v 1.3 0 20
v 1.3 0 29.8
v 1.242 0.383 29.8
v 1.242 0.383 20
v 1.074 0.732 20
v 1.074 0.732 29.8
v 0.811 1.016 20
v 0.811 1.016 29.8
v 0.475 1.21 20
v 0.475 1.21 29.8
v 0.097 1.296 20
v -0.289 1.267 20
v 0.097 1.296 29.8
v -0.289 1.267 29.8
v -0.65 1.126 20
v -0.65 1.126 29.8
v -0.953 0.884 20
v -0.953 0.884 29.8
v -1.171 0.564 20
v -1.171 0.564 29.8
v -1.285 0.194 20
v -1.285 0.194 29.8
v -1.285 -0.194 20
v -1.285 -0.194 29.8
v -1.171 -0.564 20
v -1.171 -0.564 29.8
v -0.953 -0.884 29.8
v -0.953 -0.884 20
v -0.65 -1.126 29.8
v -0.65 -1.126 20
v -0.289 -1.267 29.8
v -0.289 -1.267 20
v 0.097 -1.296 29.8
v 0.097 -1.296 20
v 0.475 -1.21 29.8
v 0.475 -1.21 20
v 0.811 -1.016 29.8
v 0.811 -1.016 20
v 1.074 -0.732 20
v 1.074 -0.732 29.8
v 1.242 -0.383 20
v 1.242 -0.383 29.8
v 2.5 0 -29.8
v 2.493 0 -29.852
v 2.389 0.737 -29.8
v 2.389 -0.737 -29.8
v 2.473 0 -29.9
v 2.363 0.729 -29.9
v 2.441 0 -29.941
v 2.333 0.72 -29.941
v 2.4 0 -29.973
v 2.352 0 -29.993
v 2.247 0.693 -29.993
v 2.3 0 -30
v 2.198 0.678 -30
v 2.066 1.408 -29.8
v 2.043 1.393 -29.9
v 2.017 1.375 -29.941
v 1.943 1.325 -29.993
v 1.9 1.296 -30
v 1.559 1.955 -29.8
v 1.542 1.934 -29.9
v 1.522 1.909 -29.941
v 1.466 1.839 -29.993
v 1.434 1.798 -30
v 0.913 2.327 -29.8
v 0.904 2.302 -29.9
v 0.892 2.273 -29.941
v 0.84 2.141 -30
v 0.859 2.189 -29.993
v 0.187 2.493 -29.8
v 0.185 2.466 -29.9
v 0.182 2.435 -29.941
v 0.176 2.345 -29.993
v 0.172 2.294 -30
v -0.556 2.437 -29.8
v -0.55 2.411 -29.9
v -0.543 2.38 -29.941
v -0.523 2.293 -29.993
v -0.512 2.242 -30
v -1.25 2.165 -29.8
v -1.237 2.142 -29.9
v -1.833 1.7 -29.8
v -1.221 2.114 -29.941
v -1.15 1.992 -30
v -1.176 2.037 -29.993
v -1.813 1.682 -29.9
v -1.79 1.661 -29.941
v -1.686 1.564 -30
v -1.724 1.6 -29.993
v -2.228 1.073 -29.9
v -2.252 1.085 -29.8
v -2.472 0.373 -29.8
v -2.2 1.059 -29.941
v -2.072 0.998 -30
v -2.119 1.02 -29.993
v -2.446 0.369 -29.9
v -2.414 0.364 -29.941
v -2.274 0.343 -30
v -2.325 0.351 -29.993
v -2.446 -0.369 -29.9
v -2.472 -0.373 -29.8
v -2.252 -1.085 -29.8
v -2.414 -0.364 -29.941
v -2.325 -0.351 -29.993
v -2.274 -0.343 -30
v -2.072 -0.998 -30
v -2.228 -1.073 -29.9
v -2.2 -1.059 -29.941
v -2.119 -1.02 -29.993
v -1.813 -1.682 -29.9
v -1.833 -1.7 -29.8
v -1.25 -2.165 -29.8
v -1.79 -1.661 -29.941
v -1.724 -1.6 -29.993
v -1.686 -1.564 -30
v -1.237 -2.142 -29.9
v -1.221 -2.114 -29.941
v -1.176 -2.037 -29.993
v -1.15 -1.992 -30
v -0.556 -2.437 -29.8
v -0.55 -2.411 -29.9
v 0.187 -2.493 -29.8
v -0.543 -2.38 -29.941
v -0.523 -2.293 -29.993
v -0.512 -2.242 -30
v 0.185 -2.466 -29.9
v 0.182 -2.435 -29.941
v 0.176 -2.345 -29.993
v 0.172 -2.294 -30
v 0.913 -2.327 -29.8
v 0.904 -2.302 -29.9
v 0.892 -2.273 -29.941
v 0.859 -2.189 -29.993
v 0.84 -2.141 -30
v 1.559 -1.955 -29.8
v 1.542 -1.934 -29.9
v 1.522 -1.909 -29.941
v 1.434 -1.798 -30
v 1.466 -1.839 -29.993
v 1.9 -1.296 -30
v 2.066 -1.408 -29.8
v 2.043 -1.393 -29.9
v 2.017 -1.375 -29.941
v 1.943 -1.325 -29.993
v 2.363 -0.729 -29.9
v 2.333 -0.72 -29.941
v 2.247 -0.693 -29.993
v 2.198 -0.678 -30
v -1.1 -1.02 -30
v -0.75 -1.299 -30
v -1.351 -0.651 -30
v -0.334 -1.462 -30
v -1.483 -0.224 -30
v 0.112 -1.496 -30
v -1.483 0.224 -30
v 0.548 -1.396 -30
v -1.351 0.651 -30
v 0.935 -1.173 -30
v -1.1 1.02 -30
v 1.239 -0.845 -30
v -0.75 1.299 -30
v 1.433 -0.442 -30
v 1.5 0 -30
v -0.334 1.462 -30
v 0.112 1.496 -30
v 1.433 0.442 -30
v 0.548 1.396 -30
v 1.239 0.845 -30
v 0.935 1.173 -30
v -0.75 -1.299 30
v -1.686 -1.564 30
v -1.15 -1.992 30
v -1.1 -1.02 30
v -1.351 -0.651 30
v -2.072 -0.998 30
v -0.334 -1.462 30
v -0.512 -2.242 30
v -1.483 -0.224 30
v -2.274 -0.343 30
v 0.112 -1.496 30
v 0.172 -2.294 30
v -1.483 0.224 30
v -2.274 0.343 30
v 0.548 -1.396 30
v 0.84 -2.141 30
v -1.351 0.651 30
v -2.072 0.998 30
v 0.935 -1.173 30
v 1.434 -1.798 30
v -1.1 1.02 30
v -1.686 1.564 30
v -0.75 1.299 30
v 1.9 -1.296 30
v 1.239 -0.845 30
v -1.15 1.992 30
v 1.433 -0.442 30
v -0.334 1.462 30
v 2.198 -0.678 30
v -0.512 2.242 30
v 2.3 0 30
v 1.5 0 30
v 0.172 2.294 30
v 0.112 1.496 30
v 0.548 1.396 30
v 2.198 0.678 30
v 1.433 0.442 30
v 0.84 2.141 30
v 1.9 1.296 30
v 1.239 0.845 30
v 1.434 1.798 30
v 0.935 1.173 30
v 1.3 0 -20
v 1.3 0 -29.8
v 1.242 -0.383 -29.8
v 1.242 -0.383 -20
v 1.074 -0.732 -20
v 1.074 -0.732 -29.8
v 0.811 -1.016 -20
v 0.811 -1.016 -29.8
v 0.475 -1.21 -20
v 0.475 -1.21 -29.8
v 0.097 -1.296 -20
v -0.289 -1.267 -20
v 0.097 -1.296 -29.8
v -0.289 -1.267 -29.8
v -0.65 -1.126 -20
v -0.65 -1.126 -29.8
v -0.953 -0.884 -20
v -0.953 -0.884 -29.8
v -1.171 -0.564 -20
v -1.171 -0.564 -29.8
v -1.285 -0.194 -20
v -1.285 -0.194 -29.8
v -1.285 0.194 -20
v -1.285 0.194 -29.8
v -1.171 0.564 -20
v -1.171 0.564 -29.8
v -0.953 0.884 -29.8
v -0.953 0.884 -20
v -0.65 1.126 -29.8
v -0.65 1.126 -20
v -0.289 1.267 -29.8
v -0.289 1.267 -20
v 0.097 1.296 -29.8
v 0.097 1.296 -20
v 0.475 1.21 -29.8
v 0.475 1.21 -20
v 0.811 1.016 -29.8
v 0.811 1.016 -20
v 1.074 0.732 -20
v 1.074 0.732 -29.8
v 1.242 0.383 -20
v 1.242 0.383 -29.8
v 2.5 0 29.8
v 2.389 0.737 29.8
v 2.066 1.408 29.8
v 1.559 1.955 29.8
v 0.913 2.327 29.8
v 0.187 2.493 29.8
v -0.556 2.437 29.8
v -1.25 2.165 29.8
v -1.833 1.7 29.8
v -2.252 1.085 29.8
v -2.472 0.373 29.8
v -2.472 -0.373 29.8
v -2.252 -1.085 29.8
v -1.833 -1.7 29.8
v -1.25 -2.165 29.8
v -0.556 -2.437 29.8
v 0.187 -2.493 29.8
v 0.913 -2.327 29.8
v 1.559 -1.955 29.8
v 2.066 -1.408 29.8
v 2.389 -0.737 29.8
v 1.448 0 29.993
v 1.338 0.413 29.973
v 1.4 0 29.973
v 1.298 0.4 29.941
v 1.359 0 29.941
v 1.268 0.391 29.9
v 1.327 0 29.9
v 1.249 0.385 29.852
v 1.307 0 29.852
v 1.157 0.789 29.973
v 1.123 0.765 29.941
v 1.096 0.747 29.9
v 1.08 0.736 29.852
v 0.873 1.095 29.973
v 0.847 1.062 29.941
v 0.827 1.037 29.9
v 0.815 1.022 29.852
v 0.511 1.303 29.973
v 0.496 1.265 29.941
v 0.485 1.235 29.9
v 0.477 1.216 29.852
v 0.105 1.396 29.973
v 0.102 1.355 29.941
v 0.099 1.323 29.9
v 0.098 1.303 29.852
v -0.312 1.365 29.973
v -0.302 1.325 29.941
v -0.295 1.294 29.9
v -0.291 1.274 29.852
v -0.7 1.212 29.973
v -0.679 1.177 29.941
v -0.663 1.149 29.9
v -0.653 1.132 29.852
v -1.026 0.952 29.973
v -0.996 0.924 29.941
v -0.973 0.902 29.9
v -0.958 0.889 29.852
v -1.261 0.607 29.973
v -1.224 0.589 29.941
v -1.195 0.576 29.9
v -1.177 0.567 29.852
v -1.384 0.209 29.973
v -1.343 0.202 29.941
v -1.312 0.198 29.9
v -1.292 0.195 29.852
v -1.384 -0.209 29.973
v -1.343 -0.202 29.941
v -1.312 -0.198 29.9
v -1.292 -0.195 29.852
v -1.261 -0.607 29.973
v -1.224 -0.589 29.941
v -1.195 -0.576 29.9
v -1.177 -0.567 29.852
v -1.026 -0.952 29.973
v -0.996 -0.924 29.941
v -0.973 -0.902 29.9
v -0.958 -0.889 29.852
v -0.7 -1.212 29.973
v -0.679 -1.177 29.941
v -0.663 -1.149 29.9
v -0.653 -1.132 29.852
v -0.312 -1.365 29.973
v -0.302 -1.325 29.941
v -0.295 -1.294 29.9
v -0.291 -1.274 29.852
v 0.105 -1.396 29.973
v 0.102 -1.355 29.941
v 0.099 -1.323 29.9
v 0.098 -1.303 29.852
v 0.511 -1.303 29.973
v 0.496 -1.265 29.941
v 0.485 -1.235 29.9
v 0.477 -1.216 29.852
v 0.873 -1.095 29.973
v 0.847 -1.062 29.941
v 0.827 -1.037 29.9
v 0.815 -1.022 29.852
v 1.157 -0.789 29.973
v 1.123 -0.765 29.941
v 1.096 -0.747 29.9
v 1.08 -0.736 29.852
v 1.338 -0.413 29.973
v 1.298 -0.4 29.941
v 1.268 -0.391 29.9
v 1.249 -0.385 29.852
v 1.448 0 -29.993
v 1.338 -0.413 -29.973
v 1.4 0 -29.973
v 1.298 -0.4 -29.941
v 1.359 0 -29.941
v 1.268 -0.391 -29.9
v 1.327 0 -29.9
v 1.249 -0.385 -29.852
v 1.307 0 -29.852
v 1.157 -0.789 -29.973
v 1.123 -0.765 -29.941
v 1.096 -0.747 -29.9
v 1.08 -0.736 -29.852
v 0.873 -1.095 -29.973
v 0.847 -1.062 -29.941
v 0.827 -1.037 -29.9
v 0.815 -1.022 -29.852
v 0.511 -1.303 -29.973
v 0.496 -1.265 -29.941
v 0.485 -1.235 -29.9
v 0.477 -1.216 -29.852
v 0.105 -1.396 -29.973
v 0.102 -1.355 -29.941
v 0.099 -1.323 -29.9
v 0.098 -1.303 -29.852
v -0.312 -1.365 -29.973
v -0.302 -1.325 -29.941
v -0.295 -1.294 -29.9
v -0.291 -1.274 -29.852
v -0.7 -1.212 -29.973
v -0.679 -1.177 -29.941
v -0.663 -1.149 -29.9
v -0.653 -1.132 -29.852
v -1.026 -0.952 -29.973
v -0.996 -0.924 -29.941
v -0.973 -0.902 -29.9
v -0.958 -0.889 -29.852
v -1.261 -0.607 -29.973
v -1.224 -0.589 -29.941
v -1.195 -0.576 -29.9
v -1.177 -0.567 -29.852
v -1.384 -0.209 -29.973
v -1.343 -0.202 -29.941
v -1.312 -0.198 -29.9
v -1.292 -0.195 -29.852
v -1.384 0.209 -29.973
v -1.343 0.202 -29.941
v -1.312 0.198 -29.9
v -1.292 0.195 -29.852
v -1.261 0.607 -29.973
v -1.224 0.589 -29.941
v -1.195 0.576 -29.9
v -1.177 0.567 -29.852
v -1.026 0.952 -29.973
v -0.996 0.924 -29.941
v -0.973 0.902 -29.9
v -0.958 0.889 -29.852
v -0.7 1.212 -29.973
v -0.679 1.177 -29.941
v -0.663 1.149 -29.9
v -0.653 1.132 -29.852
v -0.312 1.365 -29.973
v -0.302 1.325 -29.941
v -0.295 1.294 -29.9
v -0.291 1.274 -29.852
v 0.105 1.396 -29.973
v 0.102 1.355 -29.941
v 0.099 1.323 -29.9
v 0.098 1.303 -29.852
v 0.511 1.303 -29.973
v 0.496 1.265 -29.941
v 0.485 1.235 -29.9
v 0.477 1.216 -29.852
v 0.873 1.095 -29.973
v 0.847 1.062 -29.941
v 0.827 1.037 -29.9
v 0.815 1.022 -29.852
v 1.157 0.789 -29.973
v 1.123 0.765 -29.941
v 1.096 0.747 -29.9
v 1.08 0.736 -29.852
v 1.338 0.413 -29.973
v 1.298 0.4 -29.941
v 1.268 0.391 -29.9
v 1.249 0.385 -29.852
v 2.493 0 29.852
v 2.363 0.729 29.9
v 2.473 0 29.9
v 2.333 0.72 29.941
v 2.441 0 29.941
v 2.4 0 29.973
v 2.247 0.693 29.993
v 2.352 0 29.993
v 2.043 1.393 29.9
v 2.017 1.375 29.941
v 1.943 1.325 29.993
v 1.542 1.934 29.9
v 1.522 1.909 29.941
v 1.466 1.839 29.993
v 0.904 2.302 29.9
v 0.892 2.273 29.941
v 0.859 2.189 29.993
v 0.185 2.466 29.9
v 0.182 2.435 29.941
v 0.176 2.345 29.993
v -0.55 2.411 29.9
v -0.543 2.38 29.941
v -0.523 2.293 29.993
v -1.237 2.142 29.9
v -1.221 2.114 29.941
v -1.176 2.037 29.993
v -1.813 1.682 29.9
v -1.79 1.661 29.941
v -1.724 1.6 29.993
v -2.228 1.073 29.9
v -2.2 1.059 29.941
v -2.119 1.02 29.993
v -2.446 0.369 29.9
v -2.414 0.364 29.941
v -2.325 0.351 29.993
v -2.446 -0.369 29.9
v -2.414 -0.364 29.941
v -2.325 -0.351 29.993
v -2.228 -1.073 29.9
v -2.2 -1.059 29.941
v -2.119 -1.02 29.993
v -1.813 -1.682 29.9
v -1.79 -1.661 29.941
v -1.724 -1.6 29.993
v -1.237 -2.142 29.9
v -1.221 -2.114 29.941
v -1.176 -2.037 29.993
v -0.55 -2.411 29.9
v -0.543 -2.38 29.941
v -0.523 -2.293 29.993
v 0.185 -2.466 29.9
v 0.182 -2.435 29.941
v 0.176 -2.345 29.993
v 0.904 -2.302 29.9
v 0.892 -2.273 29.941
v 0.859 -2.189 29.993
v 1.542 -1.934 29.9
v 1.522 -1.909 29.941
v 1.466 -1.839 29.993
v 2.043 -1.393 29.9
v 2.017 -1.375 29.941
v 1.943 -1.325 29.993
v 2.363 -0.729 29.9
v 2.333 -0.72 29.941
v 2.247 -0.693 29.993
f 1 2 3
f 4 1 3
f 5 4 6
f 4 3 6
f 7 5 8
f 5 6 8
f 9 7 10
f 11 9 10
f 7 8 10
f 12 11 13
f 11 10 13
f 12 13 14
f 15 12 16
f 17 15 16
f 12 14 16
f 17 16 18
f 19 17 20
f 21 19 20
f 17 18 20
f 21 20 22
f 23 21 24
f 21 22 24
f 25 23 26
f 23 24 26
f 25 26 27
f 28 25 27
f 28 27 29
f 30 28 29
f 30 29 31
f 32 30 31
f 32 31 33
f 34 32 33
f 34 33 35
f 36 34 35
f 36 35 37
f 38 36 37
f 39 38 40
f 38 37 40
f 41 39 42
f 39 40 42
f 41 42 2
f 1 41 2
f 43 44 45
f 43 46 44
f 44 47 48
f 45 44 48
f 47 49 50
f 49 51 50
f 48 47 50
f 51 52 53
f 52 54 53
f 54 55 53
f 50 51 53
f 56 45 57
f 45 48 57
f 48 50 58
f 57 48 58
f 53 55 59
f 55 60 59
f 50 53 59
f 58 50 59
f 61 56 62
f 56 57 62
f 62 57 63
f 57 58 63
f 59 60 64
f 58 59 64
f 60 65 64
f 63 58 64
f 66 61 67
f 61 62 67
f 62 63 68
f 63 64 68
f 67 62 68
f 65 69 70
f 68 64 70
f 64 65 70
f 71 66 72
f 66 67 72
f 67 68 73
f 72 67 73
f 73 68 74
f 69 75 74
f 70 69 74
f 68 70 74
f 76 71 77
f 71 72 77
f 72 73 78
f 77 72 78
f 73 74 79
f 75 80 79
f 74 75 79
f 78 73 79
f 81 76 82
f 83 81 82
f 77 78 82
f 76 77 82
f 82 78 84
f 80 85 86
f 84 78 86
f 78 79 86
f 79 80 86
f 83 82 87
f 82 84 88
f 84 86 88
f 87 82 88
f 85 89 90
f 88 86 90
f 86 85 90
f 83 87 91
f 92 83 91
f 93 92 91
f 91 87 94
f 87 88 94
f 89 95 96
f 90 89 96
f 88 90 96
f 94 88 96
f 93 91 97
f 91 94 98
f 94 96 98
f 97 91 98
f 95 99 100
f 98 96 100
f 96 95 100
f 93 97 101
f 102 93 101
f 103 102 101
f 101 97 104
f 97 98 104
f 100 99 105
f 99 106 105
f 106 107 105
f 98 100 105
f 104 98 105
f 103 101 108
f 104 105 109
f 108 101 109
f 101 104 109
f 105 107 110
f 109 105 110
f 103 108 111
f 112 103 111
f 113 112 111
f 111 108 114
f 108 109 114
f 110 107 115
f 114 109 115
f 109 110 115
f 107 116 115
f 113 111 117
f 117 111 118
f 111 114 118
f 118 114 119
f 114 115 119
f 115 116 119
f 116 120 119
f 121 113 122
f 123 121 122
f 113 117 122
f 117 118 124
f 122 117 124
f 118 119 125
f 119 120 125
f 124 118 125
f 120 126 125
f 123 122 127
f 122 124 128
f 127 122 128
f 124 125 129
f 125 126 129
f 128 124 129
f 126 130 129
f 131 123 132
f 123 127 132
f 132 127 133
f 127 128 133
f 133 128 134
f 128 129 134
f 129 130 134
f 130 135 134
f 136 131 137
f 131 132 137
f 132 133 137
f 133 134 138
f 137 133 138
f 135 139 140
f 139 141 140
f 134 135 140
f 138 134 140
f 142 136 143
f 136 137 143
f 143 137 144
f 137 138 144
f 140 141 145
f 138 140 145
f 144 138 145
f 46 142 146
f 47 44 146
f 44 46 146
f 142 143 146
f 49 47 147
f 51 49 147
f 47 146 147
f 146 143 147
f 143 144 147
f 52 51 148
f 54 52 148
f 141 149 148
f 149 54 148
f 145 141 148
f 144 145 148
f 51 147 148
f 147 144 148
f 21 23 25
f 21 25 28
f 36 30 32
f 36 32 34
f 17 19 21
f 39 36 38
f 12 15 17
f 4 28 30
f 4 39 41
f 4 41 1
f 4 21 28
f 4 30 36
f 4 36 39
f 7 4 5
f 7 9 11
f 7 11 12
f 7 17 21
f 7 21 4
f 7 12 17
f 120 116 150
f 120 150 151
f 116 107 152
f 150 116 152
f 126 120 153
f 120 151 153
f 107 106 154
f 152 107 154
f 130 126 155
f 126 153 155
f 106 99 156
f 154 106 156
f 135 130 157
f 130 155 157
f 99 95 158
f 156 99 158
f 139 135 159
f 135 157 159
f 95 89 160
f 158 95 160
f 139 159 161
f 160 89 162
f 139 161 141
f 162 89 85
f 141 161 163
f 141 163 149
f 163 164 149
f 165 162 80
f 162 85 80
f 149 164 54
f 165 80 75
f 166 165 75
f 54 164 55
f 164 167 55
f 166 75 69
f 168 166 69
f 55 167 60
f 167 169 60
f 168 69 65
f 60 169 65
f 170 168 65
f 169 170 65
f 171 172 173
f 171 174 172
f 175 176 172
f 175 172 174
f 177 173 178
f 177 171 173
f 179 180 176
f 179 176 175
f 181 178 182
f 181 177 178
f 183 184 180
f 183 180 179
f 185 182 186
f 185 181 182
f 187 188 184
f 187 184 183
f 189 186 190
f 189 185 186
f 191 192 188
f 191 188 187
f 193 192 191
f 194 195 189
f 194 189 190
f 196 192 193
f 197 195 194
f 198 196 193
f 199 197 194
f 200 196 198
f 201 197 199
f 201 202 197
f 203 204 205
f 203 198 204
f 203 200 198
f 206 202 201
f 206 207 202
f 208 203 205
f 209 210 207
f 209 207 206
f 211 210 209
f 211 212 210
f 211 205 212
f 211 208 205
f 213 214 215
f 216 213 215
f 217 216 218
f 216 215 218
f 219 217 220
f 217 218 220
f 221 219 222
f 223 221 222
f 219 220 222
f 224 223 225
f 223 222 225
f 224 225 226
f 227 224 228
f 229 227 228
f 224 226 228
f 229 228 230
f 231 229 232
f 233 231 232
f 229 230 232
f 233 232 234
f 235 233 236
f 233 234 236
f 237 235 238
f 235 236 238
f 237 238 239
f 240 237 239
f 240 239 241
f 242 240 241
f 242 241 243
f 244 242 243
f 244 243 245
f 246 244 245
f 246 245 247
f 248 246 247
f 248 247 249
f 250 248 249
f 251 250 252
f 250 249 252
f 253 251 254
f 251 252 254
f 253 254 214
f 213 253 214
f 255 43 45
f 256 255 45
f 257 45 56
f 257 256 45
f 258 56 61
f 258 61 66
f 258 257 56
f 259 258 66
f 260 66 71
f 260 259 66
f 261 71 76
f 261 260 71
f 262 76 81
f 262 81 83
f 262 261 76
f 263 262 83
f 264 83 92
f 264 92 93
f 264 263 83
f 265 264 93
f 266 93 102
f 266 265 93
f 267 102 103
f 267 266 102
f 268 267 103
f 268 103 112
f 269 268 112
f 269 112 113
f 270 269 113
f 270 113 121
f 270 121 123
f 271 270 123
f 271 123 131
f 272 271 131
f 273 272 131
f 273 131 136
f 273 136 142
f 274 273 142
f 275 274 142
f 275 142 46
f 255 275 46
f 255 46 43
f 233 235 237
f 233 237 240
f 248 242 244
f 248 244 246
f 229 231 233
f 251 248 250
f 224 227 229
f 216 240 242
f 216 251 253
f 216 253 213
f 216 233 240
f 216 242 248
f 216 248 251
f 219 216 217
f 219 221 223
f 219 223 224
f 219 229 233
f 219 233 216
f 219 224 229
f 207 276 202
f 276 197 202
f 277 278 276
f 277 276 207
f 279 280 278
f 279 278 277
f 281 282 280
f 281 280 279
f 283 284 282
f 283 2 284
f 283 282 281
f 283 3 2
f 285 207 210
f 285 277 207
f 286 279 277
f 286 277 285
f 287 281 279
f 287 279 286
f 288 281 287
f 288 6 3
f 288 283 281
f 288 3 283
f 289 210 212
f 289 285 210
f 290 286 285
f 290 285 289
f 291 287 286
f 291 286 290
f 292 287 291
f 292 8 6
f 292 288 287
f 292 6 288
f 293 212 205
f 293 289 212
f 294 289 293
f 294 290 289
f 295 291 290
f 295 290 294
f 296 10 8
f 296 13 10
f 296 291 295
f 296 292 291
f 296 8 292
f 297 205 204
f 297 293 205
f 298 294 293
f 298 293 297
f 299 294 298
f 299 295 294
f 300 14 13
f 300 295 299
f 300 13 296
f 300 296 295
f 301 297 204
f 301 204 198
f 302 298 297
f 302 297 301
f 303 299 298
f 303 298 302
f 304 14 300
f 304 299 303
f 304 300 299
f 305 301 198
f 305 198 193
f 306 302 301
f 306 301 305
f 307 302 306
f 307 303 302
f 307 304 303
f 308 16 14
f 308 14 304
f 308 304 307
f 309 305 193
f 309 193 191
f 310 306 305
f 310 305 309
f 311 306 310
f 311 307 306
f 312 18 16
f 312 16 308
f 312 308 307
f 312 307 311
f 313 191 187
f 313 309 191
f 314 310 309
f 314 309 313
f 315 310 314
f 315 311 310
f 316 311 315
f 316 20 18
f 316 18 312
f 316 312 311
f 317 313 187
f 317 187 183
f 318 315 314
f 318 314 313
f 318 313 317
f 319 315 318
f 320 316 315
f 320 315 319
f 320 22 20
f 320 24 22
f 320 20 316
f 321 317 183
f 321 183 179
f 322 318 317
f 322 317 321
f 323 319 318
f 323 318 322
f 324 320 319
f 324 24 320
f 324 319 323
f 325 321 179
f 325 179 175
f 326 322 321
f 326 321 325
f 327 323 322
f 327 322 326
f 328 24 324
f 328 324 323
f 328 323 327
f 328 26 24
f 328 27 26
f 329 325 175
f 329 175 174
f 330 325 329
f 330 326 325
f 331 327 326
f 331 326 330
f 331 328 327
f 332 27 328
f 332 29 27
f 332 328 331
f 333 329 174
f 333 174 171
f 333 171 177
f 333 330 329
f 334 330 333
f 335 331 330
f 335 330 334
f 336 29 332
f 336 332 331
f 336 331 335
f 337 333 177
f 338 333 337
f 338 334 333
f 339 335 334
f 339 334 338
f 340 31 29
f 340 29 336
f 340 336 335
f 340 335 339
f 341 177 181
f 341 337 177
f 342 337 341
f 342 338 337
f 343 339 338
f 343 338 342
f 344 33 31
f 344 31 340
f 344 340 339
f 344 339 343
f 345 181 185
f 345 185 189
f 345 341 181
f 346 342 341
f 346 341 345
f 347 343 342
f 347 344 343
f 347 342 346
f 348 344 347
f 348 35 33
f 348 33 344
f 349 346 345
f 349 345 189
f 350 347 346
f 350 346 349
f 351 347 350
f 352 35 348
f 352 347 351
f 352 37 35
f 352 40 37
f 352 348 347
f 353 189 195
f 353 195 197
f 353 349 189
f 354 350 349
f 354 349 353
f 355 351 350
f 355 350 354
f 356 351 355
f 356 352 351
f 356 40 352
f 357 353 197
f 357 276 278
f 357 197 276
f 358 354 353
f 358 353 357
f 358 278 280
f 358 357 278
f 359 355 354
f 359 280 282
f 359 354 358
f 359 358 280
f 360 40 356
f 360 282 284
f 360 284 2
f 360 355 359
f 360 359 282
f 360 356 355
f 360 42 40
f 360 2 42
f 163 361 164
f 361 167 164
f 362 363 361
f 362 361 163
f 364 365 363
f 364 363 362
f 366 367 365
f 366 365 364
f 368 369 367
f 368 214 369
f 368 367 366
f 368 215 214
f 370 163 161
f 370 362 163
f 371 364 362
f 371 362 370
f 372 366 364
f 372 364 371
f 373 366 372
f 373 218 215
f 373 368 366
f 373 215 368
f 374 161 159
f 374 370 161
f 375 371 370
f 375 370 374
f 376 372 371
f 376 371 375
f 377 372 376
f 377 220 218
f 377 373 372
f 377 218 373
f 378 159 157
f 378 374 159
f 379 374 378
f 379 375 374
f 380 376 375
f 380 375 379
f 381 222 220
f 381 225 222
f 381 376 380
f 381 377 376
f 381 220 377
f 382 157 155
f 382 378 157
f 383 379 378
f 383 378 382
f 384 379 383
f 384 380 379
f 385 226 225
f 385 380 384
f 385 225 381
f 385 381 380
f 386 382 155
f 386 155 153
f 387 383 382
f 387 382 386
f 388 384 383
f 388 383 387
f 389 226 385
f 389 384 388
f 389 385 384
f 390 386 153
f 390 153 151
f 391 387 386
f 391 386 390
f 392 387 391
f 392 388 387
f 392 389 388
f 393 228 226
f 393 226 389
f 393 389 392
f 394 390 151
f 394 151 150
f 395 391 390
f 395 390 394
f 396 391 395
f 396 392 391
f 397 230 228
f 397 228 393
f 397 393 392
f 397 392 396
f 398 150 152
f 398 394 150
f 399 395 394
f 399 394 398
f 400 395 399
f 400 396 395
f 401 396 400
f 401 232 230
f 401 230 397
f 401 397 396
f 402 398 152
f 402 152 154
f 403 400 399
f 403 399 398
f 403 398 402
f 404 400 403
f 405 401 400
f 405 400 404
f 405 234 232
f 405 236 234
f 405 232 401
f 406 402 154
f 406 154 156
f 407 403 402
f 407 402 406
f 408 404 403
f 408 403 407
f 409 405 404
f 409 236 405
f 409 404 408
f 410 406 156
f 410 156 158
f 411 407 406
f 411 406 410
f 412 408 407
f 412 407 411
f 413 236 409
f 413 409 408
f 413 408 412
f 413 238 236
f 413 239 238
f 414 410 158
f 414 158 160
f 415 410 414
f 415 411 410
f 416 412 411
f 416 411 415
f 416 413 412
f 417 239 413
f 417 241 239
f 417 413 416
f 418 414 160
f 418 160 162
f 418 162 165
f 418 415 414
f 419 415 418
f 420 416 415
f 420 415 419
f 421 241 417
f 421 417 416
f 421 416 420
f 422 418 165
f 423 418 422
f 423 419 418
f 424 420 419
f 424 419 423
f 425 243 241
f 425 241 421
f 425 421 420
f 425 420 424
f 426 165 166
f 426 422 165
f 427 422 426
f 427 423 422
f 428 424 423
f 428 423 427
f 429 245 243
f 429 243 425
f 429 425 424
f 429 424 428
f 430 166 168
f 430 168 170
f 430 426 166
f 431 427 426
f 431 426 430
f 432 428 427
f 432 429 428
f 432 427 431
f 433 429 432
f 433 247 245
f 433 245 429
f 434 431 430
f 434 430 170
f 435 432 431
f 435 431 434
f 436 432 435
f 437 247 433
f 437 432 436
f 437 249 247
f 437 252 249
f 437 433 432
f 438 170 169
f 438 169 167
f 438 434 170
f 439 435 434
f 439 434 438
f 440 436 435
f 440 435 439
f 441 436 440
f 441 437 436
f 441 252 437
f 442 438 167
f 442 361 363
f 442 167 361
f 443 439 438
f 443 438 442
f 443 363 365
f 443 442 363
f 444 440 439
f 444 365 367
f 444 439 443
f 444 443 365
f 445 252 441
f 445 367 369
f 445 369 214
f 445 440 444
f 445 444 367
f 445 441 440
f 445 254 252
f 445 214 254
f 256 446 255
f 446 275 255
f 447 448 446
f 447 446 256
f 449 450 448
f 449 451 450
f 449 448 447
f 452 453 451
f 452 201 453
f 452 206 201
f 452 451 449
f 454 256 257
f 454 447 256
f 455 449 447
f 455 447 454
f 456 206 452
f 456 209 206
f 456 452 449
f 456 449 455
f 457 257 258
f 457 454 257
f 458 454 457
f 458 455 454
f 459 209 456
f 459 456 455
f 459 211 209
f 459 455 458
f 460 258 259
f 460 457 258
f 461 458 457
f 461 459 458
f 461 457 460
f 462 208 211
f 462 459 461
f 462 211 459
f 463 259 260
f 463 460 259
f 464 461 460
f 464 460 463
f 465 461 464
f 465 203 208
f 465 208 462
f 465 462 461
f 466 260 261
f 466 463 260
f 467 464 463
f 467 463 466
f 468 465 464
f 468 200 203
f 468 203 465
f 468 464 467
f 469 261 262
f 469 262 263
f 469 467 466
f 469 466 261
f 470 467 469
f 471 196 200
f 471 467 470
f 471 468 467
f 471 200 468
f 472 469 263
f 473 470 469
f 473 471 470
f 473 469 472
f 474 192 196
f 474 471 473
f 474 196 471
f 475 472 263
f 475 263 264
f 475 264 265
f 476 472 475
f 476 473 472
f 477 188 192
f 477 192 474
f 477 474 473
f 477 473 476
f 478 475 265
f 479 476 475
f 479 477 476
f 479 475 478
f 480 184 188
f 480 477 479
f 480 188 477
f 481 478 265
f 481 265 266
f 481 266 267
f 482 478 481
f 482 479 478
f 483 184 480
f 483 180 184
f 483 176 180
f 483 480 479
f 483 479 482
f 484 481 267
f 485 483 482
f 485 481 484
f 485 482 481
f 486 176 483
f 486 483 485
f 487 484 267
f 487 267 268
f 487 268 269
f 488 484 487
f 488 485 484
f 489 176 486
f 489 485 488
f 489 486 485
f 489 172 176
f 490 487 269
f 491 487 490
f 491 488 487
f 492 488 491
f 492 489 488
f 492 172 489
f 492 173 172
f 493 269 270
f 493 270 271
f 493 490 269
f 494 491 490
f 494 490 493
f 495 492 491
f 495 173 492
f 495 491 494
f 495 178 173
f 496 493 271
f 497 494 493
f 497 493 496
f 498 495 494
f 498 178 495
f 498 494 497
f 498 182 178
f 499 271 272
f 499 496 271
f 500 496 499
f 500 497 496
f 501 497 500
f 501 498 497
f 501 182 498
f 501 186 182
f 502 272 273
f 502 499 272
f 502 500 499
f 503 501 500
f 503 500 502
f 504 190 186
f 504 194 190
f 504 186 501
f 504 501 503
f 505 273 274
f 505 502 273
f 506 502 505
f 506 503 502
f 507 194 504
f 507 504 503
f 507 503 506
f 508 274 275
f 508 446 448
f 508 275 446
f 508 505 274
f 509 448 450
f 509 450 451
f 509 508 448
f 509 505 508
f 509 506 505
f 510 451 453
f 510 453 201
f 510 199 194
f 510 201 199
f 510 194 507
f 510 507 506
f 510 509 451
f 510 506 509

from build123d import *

# Parameters (mm, degrees)
F0_R     = 2.5
F1_DEPTH = 30
F2_R     = 1.3
F3_DEPTH = 10
F4_R     = 1.3
F5_DEPTH = 10
F6_R     = 0.2


with BuildPart() as f1:
    # F0 (on Top) → F1 (new body, symmetric)
    with BuildSketch(Plane.XY):
        Circle(F0_R)
    extrude(amount=F1_DEPTH, both=True)

    # F2 (on face) → F3 (cut)
    with BuildSketch(Plane.XY.offset(30)):
        Circle(F2_R)
    extrude(amount=-F3_DEPTH, mode=Mode.SUBTRACT)

    # F4 (on face) → F5 (cut)
    with BuildSketch(Plane(origin=(0, 0, -30), x_dir=(1, 0, 0), z_dir=(0, 0, -1))):
        Circle(F4_R)
    extrude(amount=-F5_DEPTH, mode=Mode.SUBTRACT)

    # F6
    f6_edges = [f1.edges().sort_by_distance(p)[0] for p in [
        (-2.5, 0, -30),
        (-1.3, 0, -30),
        (-2.5, 0, 30),
        (-1.3, 0, 30),
    ]]
    fillet(f6_edges, radius=F6_R)


solid = f1.part
